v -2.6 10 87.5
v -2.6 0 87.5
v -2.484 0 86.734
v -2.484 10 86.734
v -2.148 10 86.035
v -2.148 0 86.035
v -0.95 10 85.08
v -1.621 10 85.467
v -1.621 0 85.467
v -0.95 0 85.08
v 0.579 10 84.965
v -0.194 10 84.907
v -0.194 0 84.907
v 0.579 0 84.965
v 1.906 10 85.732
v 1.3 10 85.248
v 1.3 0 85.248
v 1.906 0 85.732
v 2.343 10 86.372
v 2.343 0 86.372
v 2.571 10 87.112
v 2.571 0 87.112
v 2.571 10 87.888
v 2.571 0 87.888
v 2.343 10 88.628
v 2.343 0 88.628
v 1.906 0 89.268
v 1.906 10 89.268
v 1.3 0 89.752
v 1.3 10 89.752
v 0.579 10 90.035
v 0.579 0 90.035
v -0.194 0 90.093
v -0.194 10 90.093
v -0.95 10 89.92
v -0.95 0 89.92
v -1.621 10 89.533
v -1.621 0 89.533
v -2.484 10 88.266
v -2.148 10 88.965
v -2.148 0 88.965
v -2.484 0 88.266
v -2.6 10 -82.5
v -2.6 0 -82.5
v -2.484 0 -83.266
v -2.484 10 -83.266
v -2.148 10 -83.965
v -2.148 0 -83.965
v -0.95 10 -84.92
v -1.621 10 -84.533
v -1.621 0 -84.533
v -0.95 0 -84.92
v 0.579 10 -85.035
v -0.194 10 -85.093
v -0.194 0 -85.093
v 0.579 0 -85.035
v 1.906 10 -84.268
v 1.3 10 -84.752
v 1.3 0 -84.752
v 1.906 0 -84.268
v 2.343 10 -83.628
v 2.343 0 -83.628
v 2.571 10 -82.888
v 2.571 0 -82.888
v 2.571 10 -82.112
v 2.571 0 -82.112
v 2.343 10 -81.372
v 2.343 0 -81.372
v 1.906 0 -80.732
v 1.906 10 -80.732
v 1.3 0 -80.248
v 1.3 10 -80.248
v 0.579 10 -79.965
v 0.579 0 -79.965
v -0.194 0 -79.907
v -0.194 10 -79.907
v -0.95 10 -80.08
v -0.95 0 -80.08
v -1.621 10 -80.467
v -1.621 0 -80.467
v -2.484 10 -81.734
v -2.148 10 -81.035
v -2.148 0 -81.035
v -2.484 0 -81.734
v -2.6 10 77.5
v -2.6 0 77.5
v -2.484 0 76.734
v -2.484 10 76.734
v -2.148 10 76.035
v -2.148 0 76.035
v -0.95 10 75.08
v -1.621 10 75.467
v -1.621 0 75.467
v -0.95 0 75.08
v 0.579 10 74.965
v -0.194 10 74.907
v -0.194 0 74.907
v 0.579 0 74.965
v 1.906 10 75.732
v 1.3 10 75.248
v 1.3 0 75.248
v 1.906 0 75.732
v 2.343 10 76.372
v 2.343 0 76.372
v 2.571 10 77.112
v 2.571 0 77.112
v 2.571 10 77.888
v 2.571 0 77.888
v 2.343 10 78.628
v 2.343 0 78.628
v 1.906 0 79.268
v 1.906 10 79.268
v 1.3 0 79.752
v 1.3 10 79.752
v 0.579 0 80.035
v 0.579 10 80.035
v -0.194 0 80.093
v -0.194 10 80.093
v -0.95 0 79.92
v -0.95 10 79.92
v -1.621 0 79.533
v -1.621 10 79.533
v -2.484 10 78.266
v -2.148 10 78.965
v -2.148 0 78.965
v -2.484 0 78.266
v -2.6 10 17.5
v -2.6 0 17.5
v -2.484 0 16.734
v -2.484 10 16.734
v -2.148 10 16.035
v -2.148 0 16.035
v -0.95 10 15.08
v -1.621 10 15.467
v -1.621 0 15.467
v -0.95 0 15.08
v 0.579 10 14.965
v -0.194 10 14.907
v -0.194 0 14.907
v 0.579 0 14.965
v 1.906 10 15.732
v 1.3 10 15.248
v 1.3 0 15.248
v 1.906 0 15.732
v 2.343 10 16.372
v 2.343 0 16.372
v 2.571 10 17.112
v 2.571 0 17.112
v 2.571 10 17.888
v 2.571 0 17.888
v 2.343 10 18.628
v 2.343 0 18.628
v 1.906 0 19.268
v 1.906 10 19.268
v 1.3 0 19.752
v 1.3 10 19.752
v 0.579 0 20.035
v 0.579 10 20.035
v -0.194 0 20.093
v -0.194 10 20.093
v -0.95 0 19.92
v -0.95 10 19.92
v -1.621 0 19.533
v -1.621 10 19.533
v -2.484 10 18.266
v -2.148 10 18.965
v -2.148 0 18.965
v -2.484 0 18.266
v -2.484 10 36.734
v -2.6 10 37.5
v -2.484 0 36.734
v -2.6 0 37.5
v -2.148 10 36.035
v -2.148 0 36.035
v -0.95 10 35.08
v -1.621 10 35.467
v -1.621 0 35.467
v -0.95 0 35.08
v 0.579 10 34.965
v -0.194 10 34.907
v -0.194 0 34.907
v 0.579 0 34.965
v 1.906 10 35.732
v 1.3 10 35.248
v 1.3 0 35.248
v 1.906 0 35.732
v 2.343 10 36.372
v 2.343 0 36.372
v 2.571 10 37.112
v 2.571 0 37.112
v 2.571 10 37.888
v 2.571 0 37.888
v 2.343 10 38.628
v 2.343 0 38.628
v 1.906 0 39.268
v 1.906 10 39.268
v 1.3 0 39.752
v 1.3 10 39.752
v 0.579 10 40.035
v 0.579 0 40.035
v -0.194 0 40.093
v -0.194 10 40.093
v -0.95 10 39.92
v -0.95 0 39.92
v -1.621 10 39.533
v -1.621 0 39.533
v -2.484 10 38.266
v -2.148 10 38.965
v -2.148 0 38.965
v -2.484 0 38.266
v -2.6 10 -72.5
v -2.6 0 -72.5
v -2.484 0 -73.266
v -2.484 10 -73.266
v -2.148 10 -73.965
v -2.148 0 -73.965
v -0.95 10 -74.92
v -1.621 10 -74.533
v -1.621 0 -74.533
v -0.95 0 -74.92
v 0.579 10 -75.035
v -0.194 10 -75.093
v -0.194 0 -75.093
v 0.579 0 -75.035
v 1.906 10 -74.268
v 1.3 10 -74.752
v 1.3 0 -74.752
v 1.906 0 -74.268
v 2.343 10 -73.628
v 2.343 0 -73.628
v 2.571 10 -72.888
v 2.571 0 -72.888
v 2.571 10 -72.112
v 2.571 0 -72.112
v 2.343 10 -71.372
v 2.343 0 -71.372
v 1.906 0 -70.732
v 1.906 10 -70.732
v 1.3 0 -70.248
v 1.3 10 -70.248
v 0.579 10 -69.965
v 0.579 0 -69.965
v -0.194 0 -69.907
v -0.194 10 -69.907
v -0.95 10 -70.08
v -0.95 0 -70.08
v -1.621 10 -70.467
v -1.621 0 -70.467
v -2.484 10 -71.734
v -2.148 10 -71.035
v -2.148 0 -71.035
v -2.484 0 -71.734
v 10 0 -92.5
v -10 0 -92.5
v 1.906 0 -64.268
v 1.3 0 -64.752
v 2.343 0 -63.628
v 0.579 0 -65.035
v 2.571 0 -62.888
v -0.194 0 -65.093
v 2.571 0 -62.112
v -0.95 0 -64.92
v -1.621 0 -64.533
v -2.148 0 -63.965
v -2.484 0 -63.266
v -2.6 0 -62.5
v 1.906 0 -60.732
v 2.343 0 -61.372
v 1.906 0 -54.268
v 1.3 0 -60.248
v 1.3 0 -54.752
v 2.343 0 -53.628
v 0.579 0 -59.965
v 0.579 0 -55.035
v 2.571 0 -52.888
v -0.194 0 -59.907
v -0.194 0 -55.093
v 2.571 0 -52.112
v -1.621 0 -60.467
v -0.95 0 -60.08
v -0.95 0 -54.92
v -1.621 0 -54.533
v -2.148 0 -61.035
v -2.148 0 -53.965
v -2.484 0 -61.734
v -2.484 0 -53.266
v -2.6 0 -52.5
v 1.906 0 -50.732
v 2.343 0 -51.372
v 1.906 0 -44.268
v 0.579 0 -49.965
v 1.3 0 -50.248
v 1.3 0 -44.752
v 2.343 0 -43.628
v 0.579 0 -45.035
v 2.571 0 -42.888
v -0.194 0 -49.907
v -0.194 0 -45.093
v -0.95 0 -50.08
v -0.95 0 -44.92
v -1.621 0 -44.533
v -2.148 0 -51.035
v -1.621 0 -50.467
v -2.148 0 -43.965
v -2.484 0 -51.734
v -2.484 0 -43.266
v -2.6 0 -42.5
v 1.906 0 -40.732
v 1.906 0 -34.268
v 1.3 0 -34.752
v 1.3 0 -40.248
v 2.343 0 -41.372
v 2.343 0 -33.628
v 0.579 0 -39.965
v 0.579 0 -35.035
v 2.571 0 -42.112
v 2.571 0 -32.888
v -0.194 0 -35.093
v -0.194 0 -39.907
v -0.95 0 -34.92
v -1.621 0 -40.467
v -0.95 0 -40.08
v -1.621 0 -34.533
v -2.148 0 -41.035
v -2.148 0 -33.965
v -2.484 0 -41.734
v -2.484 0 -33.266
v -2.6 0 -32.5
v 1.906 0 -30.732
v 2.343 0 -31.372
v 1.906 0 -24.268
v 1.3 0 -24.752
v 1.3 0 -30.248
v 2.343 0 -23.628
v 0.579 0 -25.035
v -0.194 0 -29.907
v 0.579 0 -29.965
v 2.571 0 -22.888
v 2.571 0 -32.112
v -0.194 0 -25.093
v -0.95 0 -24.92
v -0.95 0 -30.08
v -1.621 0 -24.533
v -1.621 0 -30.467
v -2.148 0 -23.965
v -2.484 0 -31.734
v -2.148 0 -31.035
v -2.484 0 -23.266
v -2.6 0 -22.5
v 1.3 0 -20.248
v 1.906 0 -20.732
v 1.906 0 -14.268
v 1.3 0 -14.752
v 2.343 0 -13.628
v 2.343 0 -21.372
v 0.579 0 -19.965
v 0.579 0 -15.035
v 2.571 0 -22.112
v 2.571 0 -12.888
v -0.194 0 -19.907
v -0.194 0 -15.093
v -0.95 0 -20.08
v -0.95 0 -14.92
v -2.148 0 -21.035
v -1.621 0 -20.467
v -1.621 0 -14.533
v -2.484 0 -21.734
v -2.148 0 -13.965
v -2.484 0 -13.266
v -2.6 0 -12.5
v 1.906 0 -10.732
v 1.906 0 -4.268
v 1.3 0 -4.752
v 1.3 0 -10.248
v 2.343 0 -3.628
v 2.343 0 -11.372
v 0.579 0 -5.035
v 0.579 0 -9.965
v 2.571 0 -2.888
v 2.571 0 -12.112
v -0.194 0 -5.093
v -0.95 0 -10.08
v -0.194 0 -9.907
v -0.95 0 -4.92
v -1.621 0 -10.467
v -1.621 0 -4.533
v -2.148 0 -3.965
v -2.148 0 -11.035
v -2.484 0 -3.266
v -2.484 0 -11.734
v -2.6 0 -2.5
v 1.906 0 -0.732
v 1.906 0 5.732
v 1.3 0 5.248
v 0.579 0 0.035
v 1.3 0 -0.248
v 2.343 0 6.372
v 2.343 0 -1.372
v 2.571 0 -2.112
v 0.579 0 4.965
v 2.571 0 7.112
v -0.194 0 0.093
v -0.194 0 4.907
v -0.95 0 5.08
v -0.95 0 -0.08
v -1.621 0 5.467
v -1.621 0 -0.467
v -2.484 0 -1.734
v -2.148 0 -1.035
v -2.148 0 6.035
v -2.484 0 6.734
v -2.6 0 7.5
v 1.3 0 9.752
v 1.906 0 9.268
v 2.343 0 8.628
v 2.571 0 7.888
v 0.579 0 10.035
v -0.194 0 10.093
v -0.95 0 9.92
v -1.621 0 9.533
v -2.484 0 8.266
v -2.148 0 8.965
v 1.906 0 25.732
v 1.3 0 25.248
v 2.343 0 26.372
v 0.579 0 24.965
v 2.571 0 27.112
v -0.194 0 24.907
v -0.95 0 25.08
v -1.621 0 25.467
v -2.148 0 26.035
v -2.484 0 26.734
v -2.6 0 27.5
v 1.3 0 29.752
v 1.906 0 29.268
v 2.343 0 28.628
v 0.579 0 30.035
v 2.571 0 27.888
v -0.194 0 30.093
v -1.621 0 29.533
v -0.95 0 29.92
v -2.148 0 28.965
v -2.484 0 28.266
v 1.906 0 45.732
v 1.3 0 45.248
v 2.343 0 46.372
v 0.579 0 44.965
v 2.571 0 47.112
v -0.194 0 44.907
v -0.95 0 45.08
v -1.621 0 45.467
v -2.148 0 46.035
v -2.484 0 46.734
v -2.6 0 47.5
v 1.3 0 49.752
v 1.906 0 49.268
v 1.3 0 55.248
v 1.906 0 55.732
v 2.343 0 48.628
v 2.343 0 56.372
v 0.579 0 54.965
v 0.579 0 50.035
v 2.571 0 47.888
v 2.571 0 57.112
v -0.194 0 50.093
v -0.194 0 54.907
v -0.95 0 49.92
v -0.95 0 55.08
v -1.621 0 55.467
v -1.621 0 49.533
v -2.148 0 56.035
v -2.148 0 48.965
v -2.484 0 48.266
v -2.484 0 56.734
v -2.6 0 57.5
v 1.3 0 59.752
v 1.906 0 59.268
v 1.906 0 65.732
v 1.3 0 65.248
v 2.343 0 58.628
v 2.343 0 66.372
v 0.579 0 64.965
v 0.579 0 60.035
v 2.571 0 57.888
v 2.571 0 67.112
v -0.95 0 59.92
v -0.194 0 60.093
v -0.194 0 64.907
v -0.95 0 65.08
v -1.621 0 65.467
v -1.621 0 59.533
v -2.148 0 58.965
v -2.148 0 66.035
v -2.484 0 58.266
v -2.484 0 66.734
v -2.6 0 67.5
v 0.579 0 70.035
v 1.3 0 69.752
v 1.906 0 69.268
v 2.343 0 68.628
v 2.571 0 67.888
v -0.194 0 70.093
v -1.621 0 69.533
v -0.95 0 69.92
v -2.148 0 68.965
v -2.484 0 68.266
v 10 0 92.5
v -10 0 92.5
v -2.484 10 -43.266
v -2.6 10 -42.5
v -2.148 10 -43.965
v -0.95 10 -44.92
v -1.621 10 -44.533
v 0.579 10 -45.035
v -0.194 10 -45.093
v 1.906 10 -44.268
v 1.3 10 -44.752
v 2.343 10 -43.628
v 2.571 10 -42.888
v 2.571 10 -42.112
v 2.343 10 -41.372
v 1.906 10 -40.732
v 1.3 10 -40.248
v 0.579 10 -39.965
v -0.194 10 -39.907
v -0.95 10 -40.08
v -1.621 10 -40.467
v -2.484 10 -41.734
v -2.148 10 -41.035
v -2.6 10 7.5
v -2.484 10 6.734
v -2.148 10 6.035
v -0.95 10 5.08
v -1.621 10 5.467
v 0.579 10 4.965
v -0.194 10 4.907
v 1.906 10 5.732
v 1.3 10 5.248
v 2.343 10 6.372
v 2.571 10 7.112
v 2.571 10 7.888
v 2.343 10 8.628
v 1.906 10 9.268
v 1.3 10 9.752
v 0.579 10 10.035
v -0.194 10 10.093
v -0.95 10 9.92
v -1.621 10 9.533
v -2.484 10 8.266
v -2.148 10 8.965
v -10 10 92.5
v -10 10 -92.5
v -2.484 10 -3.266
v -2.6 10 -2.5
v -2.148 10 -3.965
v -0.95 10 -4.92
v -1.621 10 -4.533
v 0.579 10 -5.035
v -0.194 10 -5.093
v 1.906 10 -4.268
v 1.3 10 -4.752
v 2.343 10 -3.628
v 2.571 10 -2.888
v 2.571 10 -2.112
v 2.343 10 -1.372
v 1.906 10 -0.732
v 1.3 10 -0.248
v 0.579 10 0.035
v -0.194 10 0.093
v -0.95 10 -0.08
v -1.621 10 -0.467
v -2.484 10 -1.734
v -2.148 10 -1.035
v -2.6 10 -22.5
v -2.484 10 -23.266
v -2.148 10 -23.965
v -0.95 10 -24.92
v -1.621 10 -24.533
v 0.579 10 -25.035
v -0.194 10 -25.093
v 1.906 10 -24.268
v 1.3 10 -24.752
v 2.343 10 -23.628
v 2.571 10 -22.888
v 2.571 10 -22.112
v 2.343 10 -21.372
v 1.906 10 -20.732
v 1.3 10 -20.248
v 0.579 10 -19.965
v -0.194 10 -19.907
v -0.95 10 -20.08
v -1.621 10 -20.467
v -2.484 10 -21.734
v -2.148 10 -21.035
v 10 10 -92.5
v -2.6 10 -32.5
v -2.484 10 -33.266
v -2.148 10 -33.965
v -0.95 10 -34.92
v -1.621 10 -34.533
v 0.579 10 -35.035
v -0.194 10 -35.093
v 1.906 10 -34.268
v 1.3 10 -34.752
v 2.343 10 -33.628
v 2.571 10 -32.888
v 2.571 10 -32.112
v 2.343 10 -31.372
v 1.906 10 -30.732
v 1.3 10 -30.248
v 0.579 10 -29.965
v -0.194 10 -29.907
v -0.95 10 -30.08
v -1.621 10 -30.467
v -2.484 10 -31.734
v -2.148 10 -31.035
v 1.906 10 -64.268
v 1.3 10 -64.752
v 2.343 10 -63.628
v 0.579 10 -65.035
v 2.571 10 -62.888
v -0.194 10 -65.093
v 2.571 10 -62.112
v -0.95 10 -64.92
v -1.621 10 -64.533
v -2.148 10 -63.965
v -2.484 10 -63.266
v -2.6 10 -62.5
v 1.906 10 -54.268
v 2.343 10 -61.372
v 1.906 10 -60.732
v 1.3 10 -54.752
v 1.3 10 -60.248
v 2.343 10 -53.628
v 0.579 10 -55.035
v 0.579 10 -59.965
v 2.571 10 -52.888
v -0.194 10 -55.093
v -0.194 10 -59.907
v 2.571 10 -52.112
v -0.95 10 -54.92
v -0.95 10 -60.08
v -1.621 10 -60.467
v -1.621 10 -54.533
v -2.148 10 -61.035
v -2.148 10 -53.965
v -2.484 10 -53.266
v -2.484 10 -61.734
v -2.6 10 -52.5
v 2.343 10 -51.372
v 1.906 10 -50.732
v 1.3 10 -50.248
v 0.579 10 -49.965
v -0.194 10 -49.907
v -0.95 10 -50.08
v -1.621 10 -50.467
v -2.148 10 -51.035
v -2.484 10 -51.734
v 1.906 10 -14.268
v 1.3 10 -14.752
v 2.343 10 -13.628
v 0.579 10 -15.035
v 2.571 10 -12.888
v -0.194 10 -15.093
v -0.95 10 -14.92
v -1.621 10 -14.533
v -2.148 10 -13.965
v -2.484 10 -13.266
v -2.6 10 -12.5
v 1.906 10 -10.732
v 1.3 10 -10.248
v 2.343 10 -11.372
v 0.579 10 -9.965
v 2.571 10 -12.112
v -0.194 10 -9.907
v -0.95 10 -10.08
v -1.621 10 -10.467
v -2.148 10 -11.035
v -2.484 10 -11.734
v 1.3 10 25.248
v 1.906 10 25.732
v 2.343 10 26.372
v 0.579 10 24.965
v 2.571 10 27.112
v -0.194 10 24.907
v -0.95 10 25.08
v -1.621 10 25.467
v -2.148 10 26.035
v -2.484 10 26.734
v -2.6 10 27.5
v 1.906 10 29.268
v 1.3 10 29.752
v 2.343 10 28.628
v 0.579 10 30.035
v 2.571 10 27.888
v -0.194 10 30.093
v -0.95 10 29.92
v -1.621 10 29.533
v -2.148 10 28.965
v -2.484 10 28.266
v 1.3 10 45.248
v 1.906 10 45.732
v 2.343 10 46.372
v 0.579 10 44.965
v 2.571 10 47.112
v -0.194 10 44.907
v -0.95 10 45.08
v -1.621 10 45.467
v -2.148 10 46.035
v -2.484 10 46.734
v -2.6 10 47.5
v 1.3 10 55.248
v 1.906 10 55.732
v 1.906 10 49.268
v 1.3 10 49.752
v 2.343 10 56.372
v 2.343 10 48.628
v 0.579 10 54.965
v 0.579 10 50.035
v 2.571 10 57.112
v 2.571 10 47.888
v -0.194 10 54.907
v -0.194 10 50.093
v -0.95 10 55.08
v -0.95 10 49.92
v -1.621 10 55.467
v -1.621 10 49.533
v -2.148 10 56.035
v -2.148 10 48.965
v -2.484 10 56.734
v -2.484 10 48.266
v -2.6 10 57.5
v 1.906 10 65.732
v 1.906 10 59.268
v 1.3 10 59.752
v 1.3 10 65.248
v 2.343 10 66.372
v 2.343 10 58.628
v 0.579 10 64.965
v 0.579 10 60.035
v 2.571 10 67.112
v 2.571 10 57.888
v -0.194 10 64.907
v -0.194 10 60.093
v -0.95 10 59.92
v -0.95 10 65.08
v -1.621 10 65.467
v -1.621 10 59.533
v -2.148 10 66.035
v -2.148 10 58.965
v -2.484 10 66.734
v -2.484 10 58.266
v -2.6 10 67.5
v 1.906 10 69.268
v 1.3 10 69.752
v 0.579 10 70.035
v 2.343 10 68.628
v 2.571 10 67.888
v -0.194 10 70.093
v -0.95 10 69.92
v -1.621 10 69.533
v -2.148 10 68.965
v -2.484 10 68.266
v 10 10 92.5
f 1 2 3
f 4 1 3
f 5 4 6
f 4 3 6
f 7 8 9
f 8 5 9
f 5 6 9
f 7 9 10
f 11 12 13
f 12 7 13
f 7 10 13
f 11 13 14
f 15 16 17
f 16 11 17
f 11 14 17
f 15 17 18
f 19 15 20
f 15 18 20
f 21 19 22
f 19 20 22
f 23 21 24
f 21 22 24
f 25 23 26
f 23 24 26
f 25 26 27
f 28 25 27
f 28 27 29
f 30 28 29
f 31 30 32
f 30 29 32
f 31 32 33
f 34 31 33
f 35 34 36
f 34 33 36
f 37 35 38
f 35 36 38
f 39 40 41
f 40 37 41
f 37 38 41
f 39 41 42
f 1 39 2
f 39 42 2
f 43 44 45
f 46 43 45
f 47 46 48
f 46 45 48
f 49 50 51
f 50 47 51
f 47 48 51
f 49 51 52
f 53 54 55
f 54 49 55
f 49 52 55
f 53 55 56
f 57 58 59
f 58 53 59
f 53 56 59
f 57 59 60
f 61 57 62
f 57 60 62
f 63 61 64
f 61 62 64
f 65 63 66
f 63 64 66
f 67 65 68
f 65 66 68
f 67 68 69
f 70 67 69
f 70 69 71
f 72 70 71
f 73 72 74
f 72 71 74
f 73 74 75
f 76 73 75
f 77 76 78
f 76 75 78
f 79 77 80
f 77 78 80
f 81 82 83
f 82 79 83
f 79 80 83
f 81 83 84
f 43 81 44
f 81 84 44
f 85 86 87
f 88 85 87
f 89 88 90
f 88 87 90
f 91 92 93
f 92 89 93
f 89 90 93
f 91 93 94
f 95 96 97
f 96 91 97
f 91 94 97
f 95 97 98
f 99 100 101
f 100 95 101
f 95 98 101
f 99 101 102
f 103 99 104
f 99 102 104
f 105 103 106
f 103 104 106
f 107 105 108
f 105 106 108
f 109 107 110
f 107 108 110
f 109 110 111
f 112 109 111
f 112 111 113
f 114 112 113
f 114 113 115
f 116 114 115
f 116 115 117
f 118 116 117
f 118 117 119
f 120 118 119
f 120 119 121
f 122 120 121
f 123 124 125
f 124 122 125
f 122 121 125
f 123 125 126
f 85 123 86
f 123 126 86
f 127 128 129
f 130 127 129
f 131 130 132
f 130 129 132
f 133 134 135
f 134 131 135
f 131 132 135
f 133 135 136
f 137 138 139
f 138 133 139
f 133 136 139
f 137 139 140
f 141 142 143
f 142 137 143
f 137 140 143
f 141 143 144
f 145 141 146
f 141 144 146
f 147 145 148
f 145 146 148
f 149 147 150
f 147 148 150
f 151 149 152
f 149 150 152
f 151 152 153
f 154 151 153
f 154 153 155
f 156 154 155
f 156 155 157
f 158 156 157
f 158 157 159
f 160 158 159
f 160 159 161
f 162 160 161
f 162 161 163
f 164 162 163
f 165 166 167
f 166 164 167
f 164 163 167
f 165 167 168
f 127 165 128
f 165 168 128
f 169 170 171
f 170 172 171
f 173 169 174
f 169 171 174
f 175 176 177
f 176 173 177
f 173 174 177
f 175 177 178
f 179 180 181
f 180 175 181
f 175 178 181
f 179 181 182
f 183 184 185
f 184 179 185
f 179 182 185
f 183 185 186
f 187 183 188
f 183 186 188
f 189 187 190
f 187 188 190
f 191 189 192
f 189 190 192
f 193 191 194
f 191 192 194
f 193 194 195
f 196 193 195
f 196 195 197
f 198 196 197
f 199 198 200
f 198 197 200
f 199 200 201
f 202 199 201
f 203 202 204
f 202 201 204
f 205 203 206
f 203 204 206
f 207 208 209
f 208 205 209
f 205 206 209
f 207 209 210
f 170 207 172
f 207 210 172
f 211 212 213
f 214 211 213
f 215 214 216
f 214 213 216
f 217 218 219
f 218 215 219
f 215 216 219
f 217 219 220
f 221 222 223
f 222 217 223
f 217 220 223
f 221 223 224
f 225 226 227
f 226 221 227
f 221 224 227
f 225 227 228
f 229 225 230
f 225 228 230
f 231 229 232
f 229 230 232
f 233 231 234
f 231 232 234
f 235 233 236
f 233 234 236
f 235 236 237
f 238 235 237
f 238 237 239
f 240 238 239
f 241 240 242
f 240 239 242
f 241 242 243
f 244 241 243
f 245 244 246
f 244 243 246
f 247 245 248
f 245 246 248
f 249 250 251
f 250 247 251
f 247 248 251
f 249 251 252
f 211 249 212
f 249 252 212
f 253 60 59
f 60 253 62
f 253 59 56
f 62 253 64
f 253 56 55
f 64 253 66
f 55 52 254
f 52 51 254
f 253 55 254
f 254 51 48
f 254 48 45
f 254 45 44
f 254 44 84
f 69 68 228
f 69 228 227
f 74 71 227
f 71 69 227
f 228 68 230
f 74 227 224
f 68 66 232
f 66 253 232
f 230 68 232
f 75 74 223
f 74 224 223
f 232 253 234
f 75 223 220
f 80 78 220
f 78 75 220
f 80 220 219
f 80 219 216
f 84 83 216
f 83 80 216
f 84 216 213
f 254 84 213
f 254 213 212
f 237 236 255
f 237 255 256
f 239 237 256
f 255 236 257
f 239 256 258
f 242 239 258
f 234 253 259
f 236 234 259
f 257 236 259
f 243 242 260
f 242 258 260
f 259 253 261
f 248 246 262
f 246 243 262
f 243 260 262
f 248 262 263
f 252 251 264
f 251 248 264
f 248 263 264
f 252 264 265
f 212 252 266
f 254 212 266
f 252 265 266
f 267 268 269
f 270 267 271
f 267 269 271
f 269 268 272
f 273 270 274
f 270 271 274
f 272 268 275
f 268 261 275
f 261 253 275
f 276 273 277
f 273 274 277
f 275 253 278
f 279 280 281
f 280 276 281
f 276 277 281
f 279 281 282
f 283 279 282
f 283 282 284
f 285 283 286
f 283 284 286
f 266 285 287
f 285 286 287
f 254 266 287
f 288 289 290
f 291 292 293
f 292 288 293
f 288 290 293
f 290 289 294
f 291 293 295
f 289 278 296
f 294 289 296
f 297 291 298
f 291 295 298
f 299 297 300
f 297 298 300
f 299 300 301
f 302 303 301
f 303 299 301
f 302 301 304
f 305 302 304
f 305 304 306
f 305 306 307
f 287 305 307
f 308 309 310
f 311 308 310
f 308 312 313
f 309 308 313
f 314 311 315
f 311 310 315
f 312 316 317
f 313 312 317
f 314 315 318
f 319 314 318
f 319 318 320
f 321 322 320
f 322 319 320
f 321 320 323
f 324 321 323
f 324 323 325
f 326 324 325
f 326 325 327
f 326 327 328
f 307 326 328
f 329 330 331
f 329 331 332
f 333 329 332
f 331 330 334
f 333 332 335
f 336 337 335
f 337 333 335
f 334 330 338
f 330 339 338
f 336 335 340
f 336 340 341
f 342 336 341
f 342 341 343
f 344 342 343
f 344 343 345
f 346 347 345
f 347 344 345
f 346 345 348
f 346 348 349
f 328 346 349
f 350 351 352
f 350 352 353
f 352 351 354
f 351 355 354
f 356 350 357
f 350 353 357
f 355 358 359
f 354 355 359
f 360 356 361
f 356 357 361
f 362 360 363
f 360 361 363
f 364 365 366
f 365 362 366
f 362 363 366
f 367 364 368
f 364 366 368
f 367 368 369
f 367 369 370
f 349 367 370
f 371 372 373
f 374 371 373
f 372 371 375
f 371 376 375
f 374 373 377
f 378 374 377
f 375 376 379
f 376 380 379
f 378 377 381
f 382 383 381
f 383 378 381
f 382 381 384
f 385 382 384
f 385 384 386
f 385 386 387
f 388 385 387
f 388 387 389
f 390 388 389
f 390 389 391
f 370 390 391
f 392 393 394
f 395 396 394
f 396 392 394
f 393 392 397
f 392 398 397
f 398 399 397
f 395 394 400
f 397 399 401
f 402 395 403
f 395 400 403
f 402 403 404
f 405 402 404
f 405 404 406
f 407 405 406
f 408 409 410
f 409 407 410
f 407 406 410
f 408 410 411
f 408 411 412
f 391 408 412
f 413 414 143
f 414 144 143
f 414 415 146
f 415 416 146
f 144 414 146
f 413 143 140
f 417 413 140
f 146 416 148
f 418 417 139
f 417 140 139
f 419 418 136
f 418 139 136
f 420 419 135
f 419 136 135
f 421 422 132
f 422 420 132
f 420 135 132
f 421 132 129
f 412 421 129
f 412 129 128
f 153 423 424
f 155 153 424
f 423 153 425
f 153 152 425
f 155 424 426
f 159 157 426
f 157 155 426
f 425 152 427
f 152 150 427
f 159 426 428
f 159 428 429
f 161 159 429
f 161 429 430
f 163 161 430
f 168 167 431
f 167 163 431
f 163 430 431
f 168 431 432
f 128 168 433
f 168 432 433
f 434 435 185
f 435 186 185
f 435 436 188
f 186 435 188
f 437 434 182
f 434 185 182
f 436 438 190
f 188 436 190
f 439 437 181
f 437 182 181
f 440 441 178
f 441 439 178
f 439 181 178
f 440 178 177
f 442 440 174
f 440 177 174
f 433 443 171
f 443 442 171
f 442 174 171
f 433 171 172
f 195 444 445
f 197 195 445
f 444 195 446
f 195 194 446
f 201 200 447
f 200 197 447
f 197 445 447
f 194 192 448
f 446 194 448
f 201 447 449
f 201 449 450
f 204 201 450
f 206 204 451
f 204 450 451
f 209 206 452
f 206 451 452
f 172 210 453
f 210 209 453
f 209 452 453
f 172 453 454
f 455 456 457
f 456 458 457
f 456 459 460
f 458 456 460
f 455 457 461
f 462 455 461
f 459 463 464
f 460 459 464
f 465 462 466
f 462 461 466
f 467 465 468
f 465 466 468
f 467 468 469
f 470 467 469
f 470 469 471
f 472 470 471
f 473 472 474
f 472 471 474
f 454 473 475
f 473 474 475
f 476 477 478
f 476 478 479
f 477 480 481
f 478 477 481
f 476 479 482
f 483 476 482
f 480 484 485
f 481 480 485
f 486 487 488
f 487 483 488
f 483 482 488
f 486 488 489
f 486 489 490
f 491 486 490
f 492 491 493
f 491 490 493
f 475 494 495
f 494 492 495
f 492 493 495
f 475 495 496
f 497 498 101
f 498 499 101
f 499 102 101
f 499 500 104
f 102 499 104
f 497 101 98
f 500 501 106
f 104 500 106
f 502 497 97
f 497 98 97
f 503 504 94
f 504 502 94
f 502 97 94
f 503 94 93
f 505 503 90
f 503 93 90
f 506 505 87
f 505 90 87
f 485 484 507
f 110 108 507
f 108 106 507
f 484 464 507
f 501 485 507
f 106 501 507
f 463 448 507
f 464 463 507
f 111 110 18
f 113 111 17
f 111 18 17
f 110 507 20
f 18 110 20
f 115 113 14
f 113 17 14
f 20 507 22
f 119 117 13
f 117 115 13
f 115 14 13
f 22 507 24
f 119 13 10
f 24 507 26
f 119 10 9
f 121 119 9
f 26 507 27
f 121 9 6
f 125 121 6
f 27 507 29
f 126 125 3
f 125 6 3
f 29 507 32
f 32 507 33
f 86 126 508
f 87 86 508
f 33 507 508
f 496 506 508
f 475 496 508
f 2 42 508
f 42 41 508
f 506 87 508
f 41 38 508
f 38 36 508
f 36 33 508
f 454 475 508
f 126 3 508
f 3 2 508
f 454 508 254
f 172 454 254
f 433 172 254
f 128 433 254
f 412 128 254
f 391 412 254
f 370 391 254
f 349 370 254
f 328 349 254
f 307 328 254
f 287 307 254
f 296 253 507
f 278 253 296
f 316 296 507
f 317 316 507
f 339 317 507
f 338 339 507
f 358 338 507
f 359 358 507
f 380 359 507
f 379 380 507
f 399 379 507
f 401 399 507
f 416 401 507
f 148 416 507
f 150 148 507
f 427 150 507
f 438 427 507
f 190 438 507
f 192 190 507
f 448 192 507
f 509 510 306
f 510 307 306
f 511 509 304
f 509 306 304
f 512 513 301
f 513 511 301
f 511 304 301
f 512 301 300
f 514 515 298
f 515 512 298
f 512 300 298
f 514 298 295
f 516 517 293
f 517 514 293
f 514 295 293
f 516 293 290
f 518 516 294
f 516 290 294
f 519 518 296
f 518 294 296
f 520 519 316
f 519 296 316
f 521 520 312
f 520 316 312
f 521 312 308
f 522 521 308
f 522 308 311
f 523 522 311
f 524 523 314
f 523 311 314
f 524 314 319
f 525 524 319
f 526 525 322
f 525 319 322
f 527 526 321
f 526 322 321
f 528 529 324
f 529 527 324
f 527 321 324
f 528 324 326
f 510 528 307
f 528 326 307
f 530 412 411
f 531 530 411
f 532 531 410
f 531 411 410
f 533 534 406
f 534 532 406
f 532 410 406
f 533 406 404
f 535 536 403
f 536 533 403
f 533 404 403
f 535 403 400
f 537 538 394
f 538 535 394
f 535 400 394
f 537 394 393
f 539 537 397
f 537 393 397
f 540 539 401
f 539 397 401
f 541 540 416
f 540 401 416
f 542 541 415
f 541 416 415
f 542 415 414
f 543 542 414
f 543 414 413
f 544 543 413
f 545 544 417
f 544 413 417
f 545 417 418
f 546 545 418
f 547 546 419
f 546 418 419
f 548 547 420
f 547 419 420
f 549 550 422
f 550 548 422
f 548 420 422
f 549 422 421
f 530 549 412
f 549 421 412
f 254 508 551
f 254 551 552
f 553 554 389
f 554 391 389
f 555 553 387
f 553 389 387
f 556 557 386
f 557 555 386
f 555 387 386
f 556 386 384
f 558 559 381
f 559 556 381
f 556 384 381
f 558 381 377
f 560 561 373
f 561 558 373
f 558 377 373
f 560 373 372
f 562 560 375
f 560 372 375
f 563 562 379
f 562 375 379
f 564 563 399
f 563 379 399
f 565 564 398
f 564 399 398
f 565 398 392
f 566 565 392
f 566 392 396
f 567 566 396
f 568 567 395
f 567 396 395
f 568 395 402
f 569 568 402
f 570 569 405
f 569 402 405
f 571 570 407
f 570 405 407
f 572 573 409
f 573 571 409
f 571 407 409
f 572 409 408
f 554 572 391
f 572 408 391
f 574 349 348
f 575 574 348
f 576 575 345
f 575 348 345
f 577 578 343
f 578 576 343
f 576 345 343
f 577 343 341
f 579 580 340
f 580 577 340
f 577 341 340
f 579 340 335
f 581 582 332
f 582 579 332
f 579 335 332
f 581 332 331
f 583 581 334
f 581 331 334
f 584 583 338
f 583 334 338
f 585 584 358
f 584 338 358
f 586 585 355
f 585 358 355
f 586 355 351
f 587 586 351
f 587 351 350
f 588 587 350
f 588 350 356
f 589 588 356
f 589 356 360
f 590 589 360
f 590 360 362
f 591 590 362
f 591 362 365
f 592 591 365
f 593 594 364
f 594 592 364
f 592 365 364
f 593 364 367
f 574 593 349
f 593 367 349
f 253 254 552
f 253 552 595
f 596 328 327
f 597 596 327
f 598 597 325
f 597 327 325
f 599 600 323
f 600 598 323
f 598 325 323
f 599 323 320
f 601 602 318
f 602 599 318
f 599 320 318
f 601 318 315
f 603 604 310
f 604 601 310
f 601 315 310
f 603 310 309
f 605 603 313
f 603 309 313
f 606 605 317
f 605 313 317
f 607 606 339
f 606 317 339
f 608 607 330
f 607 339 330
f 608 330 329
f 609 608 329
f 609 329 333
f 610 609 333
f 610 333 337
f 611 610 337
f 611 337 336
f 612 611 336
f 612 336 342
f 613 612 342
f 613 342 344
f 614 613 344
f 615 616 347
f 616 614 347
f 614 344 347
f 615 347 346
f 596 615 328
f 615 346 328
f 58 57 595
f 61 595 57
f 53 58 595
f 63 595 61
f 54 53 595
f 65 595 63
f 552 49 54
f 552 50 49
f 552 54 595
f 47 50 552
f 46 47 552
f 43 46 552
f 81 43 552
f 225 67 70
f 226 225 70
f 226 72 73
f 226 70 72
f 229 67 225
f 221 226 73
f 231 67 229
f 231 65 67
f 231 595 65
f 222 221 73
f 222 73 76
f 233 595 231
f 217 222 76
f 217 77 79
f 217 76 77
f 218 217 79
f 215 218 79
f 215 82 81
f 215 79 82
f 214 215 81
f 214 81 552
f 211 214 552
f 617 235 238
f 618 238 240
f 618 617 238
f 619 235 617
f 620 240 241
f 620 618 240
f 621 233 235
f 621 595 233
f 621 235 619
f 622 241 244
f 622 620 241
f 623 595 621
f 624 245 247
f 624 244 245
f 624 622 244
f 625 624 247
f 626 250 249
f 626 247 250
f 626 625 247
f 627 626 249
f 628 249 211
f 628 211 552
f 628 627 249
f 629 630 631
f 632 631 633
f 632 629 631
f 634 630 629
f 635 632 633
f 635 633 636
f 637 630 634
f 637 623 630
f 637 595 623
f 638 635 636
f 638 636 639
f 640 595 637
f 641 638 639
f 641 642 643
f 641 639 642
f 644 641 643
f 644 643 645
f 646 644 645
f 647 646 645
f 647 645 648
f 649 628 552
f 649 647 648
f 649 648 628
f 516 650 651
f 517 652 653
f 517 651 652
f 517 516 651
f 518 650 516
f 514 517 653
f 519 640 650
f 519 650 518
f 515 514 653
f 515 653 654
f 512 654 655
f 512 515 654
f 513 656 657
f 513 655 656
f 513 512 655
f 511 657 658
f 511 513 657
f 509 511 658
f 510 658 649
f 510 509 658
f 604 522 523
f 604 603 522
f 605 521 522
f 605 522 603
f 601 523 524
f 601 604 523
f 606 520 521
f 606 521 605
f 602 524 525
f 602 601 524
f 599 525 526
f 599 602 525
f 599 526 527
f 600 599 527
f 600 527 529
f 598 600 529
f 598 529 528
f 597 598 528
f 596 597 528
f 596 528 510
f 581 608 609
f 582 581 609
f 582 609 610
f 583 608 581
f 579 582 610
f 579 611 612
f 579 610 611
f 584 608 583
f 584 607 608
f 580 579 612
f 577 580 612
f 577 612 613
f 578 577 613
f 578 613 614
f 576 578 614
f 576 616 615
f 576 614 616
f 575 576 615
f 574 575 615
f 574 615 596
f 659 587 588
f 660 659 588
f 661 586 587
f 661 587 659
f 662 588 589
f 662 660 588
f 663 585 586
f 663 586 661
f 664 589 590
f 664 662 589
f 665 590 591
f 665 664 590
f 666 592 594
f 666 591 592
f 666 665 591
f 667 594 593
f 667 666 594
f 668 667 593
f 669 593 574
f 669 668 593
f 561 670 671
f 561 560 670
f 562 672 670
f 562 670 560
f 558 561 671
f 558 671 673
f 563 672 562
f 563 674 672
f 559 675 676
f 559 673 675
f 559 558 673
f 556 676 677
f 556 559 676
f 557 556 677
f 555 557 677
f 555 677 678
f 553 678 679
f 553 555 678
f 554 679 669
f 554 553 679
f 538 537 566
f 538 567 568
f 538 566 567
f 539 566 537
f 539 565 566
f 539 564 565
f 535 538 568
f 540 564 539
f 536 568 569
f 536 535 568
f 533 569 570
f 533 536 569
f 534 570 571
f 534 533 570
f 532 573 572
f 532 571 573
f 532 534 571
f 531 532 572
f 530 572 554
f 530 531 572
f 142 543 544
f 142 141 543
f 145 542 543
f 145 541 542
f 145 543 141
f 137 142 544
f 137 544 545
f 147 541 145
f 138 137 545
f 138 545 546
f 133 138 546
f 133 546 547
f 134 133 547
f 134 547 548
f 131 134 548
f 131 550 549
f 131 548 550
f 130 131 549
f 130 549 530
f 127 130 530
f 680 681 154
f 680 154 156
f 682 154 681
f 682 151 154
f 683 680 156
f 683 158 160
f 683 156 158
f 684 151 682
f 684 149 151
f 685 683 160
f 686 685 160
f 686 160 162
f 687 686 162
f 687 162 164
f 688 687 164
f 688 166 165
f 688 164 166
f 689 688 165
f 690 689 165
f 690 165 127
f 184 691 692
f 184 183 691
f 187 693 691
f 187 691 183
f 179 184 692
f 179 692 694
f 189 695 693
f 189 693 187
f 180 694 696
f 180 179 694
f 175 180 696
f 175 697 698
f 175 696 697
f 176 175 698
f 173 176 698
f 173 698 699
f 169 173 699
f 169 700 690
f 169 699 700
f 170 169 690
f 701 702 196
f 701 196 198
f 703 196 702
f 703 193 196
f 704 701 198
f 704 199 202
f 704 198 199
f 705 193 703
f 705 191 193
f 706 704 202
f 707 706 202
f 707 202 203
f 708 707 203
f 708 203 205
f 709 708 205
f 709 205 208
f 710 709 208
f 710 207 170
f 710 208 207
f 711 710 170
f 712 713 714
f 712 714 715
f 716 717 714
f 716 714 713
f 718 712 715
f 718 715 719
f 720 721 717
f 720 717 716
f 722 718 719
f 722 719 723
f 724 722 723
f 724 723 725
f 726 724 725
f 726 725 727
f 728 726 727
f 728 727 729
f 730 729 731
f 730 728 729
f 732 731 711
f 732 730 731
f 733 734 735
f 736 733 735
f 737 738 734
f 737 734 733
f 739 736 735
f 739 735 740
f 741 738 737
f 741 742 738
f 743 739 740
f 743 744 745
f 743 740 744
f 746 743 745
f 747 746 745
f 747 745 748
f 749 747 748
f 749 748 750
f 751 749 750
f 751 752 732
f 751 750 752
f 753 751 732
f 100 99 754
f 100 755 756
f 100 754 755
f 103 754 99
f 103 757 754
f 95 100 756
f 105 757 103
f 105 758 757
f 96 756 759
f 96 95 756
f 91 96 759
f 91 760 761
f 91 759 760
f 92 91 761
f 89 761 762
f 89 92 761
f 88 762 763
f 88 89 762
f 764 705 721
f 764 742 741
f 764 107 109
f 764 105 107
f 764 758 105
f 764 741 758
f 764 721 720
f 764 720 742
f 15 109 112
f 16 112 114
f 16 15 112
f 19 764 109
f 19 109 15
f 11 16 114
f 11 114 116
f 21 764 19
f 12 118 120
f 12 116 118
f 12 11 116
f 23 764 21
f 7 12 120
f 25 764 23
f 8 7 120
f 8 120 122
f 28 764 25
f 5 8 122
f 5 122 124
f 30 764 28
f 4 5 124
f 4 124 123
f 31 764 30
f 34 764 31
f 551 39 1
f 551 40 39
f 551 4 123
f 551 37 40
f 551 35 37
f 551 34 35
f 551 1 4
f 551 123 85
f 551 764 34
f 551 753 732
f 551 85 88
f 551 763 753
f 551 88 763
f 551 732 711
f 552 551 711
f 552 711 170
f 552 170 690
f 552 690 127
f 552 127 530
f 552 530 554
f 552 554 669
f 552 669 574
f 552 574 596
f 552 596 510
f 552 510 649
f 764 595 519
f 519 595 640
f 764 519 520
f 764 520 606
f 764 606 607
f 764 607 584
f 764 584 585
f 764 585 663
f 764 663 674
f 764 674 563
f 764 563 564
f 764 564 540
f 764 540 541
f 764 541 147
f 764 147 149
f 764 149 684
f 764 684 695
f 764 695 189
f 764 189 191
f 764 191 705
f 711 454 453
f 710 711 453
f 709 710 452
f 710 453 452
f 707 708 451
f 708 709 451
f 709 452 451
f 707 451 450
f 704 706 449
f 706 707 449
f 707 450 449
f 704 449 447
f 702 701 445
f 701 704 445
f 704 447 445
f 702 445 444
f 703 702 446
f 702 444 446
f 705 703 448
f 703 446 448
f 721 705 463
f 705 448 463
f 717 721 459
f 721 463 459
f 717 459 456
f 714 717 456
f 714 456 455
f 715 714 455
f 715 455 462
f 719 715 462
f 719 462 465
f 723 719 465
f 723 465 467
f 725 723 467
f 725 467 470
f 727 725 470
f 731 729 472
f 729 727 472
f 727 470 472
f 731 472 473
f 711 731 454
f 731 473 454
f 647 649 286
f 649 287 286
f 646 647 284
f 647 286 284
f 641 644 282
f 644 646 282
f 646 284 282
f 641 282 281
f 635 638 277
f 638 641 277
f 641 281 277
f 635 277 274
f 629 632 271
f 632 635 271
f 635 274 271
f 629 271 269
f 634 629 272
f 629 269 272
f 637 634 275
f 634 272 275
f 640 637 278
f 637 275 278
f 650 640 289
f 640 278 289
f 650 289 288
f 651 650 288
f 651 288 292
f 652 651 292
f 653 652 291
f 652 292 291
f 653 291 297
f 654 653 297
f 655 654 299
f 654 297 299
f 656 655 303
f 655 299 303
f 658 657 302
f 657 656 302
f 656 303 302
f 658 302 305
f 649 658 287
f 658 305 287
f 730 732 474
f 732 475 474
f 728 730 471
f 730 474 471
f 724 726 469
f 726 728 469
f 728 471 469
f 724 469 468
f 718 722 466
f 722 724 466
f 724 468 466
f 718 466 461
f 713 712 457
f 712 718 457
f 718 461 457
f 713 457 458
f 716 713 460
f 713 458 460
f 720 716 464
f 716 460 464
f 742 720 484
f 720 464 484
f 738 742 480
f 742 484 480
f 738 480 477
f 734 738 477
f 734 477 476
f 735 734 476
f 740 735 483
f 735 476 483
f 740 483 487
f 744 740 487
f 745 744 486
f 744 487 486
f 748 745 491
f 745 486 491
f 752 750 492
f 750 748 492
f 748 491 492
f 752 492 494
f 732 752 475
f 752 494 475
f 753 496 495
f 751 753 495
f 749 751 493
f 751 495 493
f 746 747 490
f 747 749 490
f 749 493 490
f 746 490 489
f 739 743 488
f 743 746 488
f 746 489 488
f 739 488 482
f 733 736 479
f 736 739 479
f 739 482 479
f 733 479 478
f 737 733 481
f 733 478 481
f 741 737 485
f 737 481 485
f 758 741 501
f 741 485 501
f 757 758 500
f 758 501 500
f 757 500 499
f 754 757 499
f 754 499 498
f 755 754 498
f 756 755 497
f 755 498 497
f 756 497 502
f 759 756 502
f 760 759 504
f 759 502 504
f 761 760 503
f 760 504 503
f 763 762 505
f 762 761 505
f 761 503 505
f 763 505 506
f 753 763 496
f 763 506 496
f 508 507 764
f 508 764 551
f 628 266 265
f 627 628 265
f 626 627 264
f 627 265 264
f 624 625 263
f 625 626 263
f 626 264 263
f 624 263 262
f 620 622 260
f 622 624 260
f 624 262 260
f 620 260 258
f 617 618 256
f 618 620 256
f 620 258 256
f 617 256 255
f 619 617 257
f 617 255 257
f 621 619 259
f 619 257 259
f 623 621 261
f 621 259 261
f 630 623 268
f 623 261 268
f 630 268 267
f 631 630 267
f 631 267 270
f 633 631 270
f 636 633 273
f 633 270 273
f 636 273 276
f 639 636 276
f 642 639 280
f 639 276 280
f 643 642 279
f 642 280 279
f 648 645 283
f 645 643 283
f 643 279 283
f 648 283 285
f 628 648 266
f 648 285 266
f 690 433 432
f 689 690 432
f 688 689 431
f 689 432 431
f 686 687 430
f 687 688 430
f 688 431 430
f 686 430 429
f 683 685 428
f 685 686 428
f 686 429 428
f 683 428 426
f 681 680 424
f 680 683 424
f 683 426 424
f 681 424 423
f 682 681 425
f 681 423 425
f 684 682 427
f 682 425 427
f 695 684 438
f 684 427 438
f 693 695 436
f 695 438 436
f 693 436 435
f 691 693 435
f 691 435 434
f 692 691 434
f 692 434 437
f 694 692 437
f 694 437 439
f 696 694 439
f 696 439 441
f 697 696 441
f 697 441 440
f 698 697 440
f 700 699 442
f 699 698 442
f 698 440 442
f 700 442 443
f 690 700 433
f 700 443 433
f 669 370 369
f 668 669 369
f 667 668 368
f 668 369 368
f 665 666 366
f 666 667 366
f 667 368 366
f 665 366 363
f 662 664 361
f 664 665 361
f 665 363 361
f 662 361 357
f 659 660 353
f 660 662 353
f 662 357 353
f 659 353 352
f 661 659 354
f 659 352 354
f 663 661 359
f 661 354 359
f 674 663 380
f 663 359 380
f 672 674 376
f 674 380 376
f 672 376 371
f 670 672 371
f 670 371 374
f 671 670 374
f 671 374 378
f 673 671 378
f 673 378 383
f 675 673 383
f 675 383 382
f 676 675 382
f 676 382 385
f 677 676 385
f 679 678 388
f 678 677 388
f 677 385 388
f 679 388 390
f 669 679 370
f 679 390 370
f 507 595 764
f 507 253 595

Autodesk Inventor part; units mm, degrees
ref_plane "YZ Plane" through (0, 0, 0) normal (1, 0, 0) x (0, 1, 0)
ref_plane "XZ Plane" through (0, 0, 0) normal (0, 1, 0) x (-1, 0, 0)
ref_plane "XY Plane" through (0, 0, 0) normal (0, 0, 1) x (1, 0, 0)
sketch "Sketch1" plane through (0, 0, 0) normal (0, 1, 0) x (-1, 0, 0)
  line L0 (-10, 92.5) -> (10, 92.5)
  line L1 (10, 92.5) -> (10, -92.5)
  line L2 (10, -92.5) -> (-10, -92.5)
  line L3 (-10, -92.5) -> (-10, 92.5)
  line L4 (-10, 92.5) -> (10, -92.5) construction
  line L5 (10, 92.5) -> (-10, -92.5) construction
  circle A0 centre (0, -82.5) radius 2.6
  circle A1 centre (0, -72.5) radius 2.6
  circle A2 centre (0, -62.5) radius 2.6
  circle A3 centre (0, -52.5) radius 2.6
  circle A4 centre (0, -42.5) radius 2.6
  circle A5 centre (0, -32.5) radius 2.6
  circle A6 centre (0, -22.5) radius 2.6
  circle A7 centre (0, -12.5) radius 2.6
  circle A8 centre (0, -2.5) radius 2.6
  circle A9 centre (0, 7.5) radius 2.6
  circle A10 centre (0, 17.5) radius 2.6
  circle A11 centre (0, 27.5) radius 2.6
  circle A12 centre (0, 37.5) radius 2.6
  circle A13 centre (0, 47.5) radius 2.6
  circle A14 centre (0, 57.5) radius 2.6
  circle A15 centre (0, 67.5) radius 2.6
  circle A16 centre (0, 77.5) radius 2.6
  circle A17 centre (0, 87.5) radius 2.6
  circle A18 centre (0, 97.5) radius 2.6
  circle A19 centre (0, 107.5) radius 2.6
  circle A20 centre (0, 117.5) radius 2.6
  circle A21 centre (0, 127.5) radius 2.6
  circle A22 centre (0, 137.5) radius 2.6
  circle A23 centre (0, 147.5) radius 2.6
  point P0 (0, 0)
  dimension "d0" = 20
  dimension "d1" = 185
  dimension "d2" = 10
  dimension "d3" = 5.2
  dimension "d6" = 10
extrude "Extrusion1" add sketch "Sketch1" along normal blind 10 contours L0 L1 L2 L3
properties part number "Zarm" material "Wood (Birch)"
